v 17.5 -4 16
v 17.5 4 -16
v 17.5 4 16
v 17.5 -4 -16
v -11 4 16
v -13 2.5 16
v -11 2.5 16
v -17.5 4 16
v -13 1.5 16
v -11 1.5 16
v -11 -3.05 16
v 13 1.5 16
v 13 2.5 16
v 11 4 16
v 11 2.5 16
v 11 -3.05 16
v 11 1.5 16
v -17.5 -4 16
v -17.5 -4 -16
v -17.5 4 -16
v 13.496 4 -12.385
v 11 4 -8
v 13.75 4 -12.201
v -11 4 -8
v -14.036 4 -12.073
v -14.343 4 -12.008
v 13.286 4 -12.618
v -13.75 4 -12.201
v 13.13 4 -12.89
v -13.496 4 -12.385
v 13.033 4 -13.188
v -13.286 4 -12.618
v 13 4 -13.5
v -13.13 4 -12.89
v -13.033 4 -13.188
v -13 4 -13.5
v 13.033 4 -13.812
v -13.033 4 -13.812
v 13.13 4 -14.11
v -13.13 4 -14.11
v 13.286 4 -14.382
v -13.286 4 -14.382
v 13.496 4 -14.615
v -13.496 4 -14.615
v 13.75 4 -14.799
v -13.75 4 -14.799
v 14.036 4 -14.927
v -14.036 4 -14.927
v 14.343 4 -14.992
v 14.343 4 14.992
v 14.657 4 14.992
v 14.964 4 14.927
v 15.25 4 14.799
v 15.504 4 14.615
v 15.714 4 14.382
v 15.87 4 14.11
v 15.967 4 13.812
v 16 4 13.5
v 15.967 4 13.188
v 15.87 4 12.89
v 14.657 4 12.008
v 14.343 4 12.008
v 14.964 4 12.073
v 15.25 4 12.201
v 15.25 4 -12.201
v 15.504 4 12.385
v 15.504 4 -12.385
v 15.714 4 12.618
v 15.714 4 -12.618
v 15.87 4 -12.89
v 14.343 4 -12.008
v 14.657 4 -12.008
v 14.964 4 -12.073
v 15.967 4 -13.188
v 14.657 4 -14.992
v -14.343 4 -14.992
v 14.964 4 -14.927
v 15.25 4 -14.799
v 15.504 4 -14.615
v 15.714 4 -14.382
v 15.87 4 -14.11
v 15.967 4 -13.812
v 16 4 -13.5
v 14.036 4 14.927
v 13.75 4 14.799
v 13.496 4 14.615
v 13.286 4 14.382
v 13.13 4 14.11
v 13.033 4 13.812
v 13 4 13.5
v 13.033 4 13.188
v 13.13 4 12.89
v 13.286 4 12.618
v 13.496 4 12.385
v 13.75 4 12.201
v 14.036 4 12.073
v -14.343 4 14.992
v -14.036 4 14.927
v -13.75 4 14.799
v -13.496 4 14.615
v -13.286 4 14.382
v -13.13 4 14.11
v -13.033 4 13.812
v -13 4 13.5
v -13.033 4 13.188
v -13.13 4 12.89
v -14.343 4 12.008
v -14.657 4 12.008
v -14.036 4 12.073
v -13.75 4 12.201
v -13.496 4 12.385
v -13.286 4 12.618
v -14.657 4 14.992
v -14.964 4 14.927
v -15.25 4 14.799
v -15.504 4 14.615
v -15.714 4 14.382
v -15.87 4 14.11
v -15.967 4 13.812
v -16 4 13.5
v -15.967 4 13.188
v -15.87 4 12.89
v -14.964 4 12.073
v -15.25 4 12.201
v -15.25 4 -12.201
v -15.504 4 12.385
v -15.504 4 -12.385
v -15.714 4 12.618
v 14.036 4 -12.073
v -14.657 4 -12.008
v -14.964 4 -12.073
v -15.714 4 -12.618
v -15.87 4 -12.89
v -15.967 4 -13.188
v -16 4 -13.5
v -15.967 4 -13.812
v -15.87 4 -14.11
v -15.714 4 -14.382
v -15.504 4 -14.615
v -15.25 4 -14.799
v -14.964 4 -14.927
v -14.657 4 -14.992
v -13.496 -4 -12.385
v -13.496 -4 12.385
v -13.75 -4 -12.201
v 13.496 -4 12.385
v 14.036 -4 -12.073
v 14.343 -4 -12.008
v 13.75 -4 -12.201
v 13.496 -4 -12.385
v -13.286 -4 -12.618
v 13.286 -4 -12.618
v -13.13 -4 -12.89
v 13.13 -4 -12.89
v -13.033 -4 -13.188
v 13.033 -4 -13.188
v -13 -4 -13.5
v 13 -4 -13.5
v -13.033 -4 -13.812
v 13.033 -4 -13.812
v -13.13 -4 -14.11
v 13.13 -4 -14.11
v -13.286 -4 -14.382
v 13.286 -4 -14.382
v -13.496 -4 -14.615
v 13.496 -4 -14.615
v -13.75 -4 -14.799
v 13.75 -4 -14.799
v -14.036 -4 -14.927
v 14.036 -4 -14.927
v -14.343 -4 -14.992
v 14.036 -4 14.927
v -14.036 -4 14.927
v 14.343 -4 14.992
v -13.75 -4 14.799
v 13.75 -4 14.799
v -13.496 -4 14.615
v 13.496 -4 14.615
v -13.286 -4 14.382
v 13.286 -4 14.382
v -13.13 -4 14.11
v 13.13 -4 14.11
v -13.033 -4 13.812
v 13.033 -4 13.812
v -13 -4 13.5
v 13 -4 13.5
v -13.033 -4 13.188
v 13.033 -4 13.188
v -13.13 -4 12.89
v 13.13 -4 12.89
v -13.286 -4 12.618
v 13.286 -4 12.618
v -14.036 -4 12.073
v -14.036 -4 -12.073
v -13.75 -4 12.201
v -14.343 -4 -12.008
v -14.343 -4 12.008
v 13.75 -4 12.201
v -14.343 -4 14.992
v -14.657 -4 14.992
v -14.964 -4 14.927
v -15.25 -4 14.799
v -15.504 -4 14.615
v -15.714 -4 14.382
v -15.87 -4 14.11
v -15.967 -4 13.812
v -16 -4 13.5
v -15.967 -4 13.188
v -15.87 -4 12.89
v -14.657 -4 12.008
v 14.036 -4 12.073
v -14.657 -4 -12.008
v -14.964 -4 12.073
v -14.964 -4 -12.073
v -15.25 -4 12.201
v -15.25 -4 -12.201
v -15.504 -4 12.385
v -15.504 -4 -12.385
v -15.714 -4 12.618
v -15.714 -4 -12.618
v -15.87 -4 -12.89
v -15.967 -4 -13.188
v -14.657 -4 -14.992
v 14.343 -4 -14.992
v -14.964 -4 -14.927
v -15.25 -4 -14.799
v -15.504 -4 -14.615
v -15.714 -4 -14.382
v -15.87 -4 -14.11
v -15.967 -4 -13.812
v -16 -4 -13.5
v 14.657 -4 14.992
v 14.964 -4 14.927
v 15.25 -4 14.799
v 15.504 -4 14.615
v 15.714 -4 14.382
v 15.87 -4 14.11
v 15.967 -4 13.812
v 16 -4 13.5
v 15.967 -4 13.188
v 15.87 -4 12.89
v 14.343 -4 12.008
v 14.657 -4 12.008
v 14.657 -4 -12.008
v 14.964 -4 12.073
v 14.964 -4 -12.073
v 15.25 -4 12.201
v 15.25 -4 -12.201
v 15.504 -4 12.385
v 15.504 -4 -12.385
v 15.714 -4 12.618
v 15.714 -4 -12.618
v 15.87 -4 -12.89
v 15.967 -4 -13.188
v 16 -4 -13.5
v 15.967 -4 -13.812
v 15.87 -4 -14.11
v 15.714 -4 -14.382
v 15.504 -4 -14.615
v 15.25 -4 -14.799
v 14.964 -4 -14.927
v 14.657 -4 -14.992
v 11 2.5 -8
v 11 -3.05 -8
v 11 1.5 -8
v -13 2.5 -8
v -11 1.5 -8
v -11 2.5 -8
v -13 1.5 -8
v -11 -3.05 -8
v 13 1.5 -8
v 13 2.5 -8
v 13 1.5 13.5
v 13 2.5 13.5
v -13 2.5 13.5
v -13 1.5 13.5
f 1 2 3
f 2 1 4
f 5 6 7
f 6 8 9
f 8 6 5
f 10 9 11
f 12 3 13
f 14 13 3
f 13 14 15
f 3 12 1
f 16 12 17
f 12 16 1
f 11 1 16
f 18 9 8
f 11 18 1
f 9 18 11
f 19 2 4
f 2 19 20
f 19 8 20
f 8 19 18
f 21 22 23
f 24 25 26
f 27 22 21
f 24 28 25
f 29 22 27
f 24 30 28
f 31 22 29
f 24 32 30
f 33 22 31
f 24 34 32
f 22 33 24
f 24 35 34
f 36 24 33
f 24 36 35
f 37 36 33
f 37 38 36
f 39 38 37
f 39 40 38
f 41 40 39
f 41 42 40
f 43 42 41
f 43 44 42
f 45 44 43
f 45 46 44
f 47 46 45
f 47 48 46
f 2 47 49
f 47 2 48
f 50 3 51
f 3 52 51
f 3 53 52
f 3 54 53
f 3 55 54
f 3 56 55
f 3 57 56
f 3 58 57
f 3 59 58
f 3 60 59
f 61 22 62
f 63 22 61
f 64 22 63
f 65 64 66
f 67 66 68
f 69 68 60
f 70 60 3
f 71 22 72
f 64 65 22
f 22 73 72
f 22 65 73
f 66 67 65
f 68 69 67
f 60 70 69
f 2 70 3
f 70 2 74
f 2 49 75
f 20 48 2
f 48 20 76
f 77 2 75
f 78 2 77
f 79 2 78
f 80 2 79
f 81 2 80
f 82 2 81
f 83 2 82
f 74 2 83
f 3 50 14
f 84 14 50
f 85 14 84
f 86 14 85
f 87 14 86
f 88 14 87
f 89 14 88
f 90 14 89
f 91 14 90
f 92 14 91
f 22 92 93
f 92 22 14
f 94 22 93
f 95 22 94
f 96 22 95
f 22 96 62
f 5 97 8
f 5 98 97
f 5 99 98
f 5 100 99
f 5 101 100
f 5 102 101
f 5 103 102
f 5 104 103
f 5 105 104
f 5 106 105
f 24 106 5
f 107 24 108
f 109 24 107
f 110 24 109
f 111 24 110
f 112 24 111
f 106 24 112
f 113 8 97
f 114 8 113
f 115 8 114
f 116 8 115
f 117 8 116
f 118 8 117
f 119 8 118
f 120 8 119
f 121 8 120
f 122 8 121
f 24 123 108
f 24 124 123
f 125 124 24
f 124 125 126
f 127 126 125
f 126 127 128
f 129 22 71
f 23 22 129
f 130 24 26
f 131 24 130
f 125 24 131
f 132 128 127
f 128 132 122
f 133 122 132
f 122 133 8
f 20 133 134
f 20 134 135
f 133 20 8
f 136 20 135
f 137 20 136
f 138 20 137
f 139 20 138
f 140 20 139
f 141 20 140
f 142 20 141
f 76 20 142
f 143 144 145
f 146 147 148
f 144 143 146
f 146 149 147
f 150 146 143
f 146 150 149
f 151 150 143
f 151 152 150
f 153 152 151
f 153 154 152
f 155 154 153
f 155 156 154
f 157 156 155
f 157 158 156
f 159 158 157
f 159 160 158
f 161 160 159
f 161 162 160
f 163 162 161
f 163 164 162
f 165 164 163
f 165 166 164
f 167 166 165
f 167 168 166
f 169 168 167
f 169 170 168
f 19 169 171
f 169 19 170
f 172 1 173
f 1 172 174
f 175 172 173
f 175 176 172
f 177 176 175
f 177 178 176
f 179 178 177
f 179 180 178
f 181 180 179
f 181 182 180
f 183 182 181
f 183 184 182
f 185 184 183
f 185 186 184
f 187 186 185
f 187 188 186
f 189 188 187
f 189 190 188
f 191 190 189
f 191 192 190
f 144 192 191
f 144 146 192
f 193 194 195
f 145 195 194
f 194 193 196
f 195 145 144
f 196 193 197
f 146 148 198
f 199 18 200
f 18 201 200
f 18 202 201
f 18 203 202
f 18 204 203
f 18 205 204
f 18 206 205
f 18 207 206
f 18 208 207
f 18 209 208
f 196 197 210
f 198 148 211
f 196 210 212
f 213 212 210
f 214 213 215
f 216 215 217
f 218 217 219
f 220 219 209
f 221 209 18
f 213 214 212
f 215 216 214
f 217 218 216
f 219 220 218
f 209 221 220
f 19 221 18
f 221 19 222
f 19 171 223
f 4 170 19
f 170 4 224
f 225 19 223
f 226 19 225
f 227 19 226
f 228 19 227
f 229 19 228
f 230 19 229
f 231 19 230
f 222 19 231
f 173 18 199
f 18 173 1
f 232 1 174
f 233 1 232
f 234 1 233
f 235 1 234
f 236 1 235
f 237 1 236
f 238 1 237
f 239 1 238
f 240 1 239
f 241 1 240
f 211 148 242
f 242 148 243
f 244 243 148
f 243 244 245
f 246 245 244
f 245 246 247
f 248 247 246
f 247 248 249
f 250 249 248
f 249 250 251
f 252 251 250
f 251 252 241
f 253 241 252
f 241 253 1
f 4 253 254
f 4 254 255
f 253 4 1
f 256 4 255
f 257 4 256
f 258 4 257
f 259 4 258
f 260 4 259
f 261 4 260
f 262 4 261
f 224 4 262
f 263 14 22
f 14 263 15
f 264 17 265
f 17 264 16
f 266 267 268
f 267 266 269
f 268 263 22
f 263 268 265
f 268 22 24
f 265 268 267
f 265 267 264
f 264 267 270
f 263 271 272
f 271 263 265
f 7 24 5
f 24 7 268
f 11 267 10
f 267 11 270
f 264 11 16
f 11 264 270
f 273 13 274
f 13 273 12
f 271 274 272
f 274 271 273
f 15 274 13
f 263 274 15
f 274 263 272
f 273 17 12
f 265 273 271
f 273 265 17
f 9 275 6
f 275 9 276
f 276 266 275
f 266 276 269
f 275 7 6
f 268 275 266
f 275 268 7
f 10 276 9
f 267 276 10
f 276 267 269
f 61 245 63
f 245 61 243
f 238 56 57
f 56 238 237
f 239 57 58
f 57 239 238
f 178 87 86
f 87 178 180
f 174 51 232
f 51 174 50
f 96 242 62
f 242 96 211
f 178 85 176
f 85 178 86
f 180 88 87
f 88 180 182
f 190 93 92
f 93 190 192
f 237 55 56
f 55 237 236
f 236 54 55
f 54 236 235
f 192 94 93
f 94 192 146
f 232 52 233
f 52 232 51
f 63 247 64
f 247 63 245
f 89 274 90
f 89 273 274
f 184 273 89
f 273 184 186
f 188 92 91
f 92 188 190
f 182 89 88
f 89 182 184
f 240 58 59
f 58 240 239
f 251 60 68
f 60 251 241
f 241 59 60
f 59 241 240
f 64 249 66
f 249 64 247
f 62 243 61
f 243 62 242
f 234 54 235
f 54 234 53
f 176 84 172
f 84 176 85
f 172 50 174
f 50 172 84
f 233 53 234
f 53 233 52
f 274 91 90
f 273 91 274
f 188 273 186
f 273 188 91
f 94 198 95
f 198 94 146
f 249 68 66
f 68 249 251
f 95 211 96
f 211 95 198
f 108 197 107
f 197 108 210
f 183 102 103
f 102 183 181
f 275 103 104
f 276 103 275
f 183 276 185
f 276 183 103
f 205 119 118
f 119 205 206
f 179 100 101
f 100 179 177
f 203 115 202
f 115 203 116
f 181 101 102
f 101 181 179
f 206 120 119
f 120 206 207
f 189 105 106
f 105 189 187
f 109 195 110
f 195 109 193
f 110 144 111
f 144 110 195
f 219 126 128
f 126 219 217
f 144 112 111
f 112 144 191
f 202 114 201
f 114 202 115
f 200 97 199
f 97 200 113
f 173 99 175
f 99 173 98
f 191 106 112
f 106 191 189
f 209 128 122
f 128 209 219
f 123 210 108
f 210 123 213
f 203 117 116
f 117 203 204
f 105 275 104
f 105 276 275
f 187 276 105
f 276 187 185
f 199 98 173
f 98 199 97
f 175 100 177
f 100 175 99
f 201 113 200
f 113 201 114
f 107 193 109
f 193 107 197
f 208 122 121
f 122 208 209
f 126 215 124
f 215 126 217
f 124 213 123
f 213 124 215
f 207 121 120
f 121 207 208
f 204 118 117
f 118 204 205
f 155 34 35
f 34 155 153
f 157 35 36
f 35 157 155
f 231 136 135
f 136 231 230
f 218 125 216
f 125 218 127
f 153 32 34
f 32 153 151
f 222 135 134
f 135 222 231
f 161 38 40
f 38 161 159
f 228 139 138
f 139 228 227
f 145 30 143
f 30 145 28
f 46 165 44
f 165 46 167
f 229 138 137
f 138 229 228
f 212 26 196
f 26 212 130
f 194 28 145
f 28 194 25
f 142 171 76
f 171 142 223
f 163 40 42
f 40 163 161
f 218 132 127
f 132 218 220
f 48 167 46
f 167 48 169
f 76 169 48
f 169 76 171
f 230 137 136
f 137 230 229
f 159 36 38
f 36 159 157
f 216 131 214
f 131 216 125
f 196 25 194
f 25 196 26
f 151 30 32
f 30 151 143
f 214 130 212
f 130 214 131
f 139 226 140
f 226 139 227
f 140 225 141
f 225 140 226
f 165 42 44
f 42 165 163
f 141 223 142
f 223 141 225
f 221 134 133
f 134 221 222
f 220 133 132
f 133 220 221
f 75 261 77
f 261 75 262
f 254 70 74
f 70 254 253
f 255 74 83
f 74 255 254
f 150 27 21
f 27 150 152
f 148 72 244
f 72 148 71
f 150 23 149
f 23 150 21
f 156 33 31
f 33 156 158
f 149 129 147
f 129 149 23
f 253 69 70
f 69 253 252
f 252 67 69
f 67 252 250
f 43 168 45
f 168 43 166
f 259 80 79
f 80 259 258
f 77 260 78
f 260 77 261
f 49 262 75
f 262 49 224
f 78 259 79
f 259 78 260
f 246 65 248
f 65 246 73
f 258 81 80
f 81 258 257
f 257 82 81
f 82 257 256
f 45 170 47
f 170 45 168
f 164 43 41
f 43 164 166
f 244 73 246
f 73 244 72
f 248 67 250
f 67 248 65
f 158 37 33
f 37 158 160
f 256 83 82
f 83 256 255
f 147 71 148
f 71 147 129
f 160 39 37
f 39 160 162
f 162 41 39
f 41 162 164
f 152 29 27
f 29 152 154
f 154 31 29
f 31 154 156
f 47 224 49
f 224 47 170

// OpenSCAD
$fn=30;
height=32;
lenght=35;
width=8;
difference(){
    cube([lenght,width,height],center=true);
    translate([0,1,4])cube([lenght-13,width-2,height-8],center=true);
    translate([0,1,4])cube([lenght-13,width+0.1,height-8],center=true);
    translate([11,2,4])cube([lenght-31,width-7,height-8],center=true);
    translate([-11,2,4])cube([lenght-31,width-7,height-8],center=true);
    rotate([90,0,0])translate([14.5,13.5,0])cylinder(h=99,r=1.5,center=true);
    rotate([90,0,0])translate([-14.5,13.5,0])cylinder(h=99,r=1.5,center=true);
    rotate([90,0,0])translate([-14.5,-13.5,0])cylinder(h=99,r=1.5,center=true);
    rotate([90,0,0])translate([14.5,-13.5,0])cylinder(h=99,r=1.5,center=true);
}
